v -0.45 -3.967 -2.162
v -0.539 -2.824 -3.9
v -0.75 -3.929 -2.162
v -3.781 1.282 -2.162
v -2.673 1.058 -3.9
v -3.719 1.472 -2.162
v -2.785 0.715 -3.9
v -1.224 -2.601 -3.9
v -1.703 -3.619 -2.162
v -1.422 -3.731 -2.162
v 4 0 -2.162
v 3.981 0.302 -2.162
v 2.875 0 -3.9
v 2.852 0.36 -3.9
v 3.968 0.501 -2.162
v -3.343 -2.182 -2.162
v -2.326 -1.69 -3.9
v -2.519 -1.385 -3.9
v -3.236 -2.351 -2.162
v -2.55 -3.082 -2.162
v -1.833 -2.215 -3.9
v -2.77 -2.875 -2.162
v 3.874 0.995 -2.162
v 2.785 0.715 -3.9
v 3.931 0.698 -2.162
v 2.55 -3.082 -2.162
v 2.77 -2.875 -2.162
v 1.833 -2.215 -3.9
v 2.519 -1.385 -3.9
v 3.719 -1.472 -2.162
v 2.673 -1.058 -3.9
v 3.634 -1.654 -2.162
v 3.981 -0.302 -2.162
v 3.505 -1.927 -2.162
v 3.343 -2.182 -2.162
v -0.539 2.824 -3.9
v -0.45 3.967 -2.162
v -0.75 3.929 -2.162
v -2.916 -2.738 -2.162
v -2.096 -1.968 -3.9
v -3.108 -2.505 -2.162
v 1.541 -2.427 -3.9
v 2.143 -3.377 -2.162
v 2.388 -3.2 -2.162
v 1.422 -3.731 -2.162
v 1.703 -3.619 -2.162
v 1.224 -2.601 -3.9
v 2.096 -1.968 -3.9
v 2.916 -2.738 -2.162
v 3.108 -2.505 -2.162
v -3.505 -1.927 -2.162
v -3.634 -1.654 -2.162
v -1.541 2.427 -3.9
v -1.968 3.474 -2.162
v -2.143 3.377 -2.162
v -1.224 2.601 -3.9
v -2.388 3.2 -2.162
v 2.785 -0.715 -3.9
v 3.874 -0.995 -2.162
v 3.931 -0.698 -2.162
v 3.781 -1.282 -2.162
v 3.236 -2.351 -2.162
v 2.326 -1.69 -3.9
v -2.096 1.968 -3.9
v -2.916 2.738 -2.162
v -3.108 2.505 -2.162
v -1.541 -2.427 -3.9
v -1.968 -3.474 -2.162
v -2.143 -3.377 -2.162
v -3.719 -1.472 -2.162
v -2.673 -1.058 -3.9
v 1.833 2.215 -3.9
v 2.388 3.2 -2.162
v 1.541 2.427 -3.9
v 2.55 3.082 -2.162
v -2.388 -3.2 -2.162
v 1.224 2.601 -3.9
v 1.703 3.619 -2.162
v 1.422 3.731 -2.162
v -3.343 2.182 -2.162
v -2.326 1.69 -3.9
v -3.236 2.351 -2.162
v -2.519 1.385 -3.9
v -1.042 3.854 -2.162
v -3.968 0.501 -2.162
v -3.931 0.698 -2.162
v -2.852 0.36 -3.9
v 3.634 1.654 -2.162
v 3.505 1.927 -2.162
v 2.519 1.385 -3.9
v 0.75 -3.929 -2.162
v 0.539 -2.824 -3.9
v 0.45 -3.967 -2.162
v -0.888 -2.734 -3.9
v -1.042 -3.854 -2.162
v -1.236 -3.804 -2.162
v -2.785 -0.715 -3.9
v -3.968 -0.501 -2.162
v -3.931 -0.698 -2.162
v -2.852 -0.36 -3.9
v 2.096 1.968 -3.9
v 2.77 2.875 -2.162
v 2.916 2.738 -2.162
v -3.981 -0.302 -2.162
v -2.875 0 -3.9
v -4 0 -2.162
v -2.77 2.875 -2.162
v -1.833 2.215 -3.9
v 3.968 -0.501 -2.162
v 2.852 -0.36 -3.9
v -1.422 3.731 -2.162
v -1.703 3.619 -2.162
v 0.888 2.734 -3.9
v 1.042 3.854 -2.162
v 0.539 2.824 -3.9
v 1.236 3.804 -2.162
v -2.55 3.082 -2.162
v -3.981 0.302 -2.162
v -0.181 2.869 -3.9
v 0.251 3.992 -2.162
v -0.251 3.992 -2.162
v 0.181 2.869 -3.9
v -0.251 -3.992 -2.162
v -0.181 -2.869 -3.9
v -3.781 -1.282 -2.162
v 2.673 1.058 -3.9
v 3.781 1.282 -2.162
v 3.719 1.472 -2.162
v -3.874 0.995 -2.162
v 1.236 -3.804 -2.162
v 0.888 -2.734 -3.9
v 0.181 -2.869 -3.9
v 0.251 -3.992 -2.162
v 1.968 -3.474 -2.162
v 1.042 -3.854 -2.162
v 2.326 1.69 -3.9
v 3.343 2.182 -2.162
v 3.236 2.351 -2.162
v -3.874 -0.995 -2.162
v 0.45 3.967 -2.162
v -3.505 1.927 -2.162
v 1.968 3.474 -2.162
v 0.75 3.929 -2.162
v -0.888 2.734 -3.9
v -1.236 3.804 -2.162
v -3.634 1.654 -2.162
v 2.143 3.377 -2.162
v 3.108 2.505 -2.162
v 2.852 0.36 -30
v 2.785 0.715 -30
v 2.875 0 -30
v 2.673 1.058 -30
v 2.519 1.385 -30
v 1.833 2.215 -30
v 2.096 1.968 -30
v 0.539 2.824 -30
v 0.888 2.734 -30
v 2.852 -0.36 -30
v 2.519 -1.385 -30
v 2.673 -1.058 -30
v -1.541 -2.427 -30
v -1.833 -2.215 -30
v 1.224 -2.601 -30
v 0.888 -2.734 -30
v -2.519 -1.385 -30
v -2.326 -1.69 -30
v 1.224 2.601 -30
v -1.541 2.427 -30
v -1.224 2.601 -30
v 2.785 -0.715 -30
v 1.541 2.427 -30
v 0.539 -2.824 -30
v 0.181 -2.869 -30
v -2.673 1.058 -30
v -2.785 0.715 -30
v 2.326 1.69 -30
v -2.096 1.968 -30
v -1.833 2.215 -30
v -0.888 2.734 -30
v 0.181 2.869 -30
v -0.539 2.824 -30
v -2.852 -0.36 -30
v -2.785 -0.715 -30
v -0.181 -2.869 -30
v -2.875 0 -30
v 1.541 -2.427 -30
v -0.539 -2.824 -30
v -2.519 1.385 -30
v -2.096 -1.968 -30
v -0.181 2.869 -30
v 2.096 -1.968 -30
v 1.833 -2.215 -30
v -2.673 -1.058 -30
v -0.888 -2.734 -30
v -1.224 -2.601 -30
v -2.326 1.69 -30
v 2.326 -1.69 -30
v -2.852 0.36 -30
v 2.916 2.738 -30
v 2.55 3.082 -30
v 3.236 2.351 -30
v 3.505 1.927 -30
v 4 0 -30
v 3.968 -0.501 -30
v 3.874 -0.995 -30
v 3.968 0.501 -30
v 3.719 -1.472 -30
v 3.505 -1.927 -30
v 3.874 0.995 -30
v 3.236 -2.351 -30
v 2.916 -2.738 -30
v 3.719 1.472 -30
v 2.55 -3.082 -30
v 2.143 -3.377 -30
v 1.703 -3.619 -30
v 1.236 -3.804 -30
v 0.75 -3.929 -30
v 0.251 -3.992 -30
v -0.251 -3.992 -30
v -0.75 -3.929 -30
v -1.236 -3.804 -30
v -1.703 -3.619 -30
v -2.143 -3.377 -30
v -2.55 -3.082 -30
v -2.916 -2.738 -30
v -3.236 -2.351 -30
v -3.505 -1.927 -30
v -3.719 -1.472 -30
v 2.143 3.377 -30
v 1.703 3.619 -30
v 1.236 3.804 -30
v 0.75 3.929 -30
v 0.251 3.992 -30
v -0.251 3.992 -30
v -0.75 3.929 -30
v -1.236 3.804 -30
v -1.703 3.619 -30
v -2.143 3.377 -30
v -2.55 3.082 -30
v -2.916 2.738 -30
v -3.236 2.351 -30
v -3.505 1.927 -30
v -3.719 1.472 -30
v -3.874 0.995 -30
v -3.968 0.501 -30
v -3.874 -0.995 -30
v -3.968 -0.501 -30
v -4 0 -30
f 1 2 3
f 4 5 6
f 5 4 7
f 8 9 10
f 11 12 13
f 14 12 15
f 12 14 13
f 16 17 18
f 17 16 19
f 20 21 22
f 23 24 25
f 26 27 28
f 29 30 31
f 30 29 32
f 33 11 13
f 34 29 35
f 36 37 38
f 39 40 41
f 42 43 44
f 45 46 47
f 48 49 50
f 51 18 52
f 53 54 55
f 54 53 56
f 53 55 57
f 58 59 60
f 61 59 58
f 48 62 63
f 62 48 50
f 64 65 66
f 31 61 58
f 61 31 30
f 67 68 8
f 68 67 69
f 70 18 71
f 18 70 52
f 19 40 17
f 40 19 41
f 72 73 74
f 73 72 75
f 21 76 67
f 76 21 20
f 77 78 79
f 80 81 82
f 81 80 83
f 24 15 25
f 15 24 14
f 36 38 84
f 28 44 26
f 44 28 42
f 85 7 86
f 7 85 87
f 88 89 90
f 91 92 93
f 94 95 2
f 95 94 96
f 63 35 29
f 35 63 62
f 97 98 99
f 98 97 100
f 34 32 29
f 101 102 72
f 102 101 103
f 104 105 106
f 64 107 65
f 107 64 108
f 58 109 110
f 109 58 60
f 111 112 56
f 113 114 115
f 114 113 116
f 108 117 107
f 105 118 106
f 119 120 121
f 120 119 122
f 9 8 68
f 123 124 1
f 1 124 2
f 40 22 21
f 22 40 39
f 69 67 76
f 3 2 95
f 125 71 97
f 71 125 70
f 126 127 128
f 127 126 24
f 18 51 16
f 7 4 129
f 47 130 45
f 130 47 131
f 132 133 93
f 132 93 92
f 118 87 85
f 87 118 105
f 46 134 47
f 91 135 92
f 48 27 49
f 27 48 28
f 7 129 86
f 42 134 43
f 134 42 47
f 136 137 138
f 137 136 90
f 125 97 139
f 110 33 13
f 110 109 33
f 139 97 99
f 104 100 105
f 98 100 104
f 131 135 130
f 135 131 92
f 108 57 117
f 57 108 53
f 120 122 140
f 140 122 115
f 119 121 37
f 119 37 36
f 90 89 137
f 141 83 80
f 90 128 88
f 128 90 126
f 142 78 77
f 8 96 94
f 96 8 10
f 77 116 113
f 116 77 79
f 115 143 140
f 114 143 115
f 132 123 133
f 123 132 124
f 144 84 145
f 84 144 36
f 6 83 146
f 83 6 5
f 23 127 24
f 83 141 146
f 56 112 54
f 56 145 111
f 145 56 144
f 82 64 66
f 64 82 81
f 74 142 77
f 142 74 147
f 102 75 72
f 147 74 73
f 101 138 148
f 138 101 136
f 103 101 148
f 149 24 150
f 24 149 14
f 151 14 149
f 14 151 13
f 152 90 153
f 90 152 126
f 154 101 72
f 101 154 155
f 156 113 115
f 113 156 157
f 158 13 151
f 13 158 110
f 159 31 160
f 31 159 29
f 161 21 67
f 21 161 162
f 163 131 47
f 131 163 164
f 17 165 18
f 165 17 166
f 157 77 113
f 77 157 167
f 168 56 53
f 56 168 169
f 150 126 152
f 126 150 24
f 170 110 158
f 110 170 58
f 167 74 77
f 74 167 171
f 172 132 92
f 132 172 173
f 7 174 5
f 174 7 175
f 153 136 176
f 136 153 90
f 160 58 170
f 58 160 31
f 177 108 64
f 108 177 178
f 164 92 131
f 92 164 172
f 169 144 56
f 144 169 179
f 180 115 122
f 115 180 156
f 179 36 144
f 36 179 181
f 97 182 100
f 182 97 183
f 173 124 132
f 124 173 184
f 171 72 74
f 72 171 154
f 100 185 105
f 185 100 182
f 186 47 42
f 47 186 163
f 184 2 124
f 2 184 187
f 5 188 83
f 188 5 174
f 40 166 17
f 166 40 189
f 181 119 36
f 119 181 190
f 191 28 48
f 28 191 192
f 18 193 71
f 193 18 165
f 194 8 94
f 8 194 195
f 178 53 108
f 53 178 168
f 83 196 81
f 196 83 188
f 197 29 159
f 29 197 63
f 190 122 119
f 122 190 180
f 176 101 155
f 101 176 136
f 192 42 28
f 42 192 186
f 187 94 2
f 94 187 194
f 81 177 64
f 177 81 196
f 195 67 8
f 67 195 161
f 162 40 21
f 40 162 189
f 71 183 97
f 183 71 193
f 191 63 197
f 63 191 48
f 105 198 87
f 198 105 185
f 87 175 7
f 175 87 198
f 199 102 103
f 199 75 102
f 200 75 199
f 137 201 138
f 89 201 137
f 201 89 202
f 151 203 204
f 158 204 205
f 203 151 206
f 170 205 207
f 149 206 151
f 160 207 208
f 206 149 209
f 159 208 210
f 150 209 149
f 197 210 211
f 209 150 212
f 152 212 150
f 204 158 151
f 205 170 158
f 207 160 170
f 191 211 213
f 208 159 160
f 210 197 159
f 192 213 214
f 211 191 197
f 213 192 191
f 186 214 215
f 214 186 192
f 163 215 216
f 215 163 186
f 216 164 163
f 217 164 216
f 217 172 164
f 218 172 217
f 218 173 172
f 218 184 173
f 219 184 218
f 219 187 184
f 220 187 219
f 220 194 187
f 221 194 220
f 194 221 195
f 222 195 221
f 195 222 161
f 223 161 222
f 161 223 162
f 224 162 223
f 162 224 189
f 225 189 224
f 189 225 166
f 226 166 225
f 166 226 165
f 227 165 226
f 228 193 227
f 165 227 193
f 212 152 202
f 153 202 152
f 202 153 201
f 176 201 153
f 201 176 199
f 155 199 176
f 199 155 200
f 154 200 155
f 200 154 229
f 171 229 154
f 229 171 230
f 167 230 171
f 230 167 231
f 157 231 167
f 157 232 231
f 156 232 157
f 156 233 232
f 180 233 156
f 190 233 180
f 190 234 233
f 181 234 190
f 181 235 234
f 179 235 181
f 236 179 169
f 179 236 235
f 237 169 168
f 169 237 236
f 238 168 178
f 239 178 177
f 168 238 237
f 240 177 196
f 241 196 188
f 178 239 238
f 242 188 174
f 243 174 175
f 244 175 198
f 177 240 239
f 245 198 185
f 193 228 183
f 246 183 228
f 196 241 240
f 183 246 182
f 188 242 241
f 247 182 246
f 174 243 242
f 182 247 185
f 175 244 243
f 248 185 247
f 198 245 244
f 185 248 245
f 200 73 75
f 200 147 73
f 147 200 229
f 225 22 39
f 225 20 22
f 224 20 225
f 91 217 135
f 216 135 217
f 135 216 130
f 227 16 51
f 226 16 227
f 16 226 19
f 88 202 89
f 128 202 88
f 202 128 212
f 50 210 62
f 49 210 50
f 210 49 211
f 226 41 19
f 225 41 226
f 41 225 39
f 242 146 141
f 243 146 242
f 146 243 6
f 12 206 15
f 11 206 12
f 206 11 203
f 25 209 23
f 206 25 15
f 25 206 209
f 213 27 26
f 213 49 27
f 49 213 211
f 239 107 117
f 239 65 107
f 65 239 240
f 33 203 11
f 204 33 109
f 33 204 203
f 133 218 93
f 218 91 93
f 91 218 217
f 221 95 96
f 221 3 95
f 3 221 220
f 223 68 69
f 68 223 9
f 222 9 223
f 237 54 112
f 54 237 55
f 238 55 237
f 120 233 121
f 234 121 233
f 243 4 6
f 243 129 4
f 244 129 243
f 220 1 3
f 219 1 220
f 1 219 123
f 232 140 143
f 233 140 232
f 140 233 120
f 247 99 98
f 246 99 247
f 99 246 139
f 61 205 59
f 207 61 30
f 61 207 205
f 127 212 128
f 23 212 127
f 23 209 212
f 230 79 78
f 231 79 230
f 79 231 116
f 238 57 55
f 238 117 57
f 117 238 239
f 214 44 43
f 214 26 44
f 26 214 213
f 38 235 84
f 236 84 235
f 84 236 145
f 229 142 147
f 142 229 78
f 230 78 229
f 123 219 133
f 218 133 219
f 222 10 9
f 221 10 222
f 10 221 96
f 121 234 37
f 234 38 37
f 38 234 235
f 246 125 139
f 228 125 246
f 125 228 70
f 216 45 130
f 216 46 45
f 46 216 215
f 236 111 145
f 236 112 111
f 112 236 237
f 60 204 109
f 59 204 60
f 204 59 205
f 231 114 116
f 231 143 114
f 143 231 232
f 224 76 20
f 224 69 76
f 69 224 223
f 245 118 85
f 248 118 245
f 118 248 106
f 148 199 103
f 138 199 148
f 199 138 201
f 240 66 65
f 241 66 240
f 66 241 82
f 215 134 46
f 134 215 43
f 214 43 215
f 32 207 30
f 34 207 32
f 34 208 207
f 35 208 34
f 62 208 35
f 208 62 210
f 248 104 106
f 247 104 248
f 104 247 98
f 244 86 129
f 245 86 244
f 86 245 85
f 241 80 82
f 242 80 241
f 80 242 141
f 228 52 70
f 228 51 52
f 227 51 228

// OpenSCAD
$fn = 50;

difference() {
	union() {
		translate(v = [0, 0, -30.0]) {
			cylinder(h = 33, r = 4.0);
		}
	}
	union() {
		translate(v = [0, 0, 0]) {
			rotate(a = [0, 0, 0]) {
				difference() {
					union() {
						translate(v = [0, 0, -33.0]) {
							cylinder(h = 33, r = 2.6);
						}
						translate(v = [0, 0, -3.9]) {
							cylinder(h = 3.9, r1 = 2.875, r2 = 5.4);
						}
						translate(v = [0, 0, -33.0]) {
							cylinder(h = 33, r = 2.875);
						}
						translate(v = [0, 0, -33.0]) {
							cylinder(h = 33, r = 2.6);
						}
					}
					union();
				}
			}
		}
		#cylinder(h = 3, r = 5.0);
	}
}
